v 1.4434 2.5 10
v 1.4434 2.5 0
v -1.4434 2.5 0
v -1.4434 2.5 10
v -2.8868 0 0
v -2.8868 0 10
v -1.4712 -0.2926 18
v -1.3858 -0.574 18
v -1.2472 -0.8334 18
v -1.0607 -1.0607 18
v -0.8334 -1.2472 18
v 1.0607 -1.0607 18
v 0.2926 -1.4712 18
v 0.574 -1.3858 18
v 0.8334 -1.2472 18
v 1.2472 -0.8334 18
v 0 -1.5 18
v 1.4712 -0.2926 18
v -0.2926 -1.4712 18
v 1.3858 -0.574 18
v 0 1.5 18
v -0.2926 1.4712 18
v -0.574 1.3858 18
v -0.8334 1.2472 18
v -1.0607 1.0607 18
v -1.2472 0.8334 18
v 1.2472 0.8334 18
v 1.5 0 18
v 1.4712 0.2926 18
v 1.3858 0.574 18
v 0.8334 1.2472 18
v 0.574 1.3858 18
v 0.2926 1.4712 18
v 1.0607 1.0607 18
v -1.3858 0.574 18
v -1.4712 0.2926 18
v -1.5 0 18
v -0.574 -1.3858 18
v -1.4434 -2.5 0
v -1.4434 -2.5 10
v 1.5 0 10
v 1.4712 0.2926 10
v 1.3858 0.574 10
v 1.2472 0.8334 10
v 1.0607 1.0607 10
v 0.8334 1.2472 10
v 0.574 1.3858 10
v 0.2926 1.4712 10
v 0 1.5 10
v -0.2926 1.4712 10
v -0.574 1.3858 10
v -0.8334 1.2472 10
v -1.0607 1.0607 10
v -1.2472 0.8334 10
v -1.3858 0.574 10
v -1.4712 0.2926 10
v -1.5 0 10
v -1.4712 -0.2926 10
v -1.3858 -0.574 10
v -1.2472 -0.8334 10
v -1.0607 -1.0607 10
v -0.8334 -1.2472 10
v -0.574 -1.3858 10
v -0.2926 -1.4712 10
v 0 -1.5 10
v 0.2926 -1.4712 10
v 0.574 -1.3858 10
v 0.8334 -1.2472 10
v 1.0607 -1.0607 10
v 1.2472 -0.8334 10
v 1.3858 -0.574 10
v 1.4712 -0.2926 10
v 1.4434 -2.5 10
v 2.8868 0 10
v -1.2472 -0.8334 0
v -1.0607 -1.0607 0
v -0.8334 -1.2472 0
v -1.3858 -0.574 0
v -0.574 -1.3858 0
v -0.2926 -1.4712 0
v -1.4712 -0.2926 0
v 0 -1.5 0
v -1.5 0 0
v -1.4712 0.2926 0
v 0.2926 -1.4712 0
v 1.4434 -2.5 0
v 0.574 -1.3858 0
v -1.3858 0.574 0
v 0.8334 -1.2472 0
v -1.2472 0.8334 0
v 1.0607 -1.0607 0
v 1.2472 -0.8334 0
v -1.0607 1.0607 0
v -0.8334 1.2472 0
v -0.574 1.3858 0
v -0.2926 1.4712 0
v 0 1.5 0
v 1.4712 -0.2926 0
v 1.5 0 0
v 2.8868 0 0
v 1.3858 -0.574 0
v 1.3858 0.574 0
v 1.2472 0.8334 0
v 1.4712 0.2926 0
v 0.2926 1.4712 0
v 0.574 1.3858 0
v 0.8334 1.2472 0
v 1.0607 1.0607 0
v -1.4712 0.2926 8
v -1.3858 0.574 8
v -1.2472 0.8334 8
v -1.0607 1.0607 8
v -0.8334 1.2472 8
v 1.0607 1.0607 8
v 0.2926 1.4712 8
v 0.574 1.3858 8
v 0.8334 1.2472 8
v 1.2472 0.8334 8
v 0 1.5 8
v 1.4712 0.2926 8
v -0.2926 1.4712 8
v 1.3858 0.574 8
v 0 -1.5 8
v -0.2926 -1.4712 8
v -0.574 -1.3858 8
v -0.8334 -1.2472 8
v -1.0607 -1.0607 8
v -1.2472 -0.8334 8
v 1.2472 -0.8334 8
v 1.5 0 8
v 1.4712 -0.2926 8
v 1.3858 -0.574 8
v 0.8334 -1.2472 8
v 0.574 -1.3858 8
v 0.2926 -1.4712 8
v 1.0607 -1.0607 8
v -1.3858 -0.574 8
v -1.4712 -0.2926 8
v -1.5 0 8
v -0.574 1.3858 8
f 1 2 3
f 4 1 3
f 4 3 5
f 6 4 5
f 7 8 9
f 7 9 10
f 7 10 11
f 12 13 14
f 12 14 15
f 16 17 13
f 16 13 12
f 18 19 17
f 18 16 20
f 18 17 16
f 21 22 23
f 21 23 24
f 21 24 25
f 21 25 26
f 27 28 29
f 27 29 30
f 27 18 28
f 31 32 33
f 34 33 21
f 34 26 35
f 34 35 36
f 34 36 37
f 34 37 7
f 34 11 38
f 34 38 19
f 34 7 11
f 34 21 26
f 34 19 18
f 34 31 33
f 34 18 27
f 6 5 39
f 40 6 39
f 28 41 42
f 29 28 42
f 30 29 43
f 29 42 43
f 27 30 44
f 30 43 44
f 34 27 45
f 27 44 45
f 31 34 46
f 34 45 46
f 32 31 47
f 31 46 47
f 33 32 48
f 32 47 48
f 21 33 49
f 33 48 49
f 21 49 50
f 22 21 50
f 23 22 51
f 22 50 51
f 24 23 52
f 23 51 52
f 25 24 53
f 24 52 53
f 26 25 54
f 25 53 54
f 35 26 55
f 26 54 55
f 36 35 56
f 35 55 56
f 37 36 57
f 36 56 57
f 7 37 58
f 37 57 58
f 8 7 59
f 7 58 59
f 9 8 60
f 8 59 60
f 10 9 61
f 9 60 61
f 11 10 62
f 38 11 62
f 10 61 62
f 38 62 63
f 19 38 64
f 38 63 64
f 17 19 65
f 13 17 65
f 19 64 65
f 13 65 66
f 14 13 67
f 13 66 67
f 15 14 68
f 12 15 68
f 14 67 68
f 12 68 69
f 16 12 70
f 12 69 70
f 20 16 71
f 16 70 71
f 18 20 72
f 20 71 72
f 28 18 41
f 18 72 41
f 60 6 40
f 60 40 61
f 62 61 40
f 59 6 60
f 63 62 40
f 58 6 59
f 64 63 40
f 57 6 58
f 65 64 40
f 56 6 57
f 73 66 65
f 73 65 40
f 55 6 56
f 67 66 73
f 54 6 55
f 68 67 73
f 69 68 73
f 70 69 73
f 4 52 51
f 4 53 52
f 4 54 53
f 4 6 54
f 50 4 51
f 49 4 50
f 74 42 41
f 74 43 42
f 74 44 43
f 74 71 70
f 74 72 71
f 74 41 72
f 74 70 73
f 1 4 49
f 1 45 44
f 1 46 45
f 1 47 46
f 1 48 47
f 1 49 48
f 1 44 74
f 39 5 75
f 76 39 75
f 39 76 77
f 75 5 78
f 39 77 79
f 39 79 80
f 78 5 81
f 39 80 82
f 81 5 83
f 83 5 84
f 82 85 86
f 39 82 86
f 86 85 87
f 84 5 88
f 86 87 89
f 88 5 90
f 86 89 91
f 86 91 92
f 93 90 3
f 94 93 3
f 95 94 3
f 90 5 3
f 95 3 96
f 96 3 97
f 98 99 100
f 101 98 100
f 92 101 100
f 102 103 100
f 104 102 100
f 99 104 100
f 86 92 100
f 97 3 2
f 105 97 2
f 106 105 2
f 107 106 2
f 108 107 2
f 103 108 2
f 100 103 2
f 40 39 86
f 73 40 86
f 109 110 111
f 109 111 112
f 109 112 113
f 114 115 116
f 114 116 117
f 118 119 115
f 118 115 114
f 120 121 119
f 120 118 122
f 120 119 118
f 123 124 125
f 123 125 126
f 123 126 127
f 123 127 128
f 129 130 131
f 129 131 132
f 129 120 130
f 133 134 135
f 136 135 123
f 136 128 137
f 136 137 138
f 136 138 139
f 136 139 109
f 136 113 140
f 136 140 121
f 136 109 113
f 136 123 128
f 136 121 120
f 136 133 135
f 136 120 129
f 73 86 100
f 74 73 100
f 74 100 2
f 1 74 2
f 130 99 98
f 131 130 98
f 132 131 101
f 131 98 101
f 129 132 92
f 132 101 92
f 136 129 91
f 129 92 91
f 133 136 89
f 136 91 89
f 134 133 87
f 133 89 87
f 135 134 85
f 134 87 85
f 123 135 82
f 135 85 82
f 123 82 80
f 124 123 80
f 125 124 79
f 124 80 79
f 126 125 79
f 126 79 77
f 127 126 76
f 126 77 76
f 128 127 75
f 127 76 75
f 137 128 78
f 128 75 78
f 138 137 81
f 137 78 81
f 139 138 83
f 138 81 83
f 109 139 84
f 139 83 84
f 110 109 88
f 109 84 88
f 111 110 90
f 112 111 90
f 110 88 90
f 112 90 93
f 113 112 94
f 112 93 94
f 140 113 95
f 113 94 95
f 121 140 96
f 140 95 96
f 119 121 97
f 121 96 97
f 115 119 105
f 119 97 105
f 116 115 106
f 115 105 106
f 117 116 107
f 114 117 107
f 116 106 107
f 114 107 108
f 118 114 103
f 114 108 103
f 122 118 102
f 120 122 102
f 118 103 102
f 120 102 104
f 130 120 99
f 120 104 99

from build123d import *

# Parameters (mm, degrees)
BOSS_EXTRU_1_DEPTH      = 10
ESQUISSE2_R             = 1.5
BOSS_EXTRU_2_DEPTH      = 8
ESQUISSE3_R             = 1.5
ENL_V_MAT_EXTRU_1_DEPTH = 8


with BuildPart() as part:
    # Esquisse1 → Boss.-Extru.1 (new body)
    with BuildSketch(Plane.XY):
        Polygon((2.886751346, 0), (1.443375673, 2.5), (-1.443375673, 2.5), (-2.886751346, 0), (-1.443375673, -2.5), (1.443375673, -2.5), align=None)
    extrude(amount=BOSS_EXTRU_1_DEPTH)

    # Esquisse2 → Boss.-Extru.2 (add)
    with BuildSketch(Plane.XY.offset(10)):
        Circle(ESQUISSE2_R)
    extrude(amount=BOSS_EXTRU_2_DEPTH)

    # Esquisse3 → Enlèv. mat.-Extru.1 (cut)
    with BuildSketch(Plane(origin=(0, 0, 0), x_dir=(-1, 0, 0), z_dir=(0, 0, -1))):
        with Locations(Location((0, 0, 0), (0, 0, 180))):
            Circle(ESQUISSE3_R)
    extrude(amount=-ENL_V_MAT_EXTRU_1_DEPTH, mode=Mode.SUBTRACT)


solid = part.part
